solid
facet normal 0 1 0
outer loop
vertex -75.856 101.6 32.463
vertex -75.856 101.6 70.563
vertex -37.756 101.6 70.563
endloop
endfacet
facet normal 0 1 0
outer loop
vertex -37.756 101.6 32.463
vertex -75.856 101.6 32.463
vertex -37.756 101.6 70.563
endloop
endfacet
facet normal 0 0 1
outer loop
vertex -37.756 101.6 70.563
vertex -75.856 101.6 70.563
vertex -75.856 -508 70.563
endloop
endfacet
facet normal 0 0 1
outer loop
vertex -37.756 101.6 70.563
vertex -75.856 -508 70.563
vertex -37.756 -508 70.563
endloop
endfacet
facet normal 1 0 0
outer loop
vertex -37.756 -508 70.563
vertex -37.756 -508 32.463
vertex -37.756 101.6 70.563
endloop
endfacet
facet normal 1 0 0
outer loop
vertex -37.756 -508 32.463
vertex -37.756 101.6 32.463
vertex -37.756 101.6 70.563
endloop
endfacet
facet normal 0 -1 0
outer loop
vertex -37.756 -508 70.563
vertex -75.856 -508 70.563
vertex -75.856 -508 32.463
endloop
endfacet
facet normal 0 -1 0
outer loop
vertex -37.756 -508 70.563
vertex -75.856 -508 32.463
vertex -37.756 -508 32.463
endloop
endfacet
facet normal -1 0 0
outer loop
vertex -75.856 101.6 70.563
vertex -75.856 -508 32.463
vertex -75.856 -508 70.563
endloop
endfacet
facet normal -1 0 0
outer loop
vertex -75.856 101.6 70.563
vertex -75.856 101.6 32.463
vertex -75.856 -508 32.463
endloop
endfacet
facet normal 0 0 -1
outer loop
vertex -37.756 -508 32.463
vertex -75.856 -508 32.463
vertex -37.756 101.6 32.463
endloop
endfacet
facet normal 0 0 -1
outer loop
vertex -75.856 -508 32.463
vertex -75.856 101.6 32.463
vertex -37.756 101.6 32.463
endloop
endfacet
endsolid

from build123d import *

# Parameters (mm, degrees)
F0_W     = 38.1
F0_H     = 38.1
F1_DEPTH = 254
F2_DEPTH = 101.6
F3_DEPTH = 152.4
F4_DEPTH = 101.6


with BuildPart() as f1:
    # F0 (on Front) → F1 (new body)
    with BuildSketch(Plane.XZ):
        with Locations((-56.8064840019, 51.512887466)):
            Rectangle(F0_W, F0_H)
    extrude(amount=F1_DEPTH)

    # F2 (add): a face of the model
    f2_faces = [f1.faces().sort_by_distance(p)[0] for p in [
        (-56.8064840019, 0, 51.512887466),
    ]]
    extrude(f2_faces, amount=F2_DEPTH)

    # F3 (add): a face of the model
    f3_faces = [f1.faces().sort_by_distance(p)[0] for p in [
        (-56.8064840019, -254, 51.512887466),
    ]]
    extrude(f3_faces, amount=F3_DEPTH)

    # F4 (add): a face of the model
    f4_faces = [f1.faces().sort_by_distance(p)[0] for p in [
        (-56.8064840019, -406.4, 51.512887466),
    ]]
    extrude(f4_faces, amount=F4_DEPTH)


solid = f1.part
